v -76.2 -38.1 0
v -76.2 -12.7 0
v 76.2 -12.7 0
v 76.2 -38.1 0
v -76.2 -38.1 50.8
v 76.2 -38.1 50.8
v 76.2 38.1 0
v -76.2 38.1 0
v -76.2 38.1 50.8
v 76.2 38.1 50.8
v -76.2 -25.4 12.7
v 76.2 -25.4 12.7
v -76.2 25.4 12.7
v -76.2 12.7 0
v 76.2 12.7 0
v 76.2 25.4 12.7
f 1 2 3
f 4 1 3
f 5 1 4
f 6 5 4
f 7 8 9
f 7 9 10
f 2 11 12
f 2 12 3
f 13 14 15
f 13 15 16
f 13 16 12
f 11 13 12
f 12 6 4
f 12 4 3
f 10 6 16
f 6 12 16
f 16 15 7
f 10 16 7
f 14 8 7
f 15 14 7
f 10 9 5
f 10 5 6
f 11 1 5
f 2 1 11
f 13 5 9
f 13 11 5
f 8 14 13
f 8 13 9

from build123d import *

# Parameters (mm, degrees)
F0_W     = 152.4
F0_H     = 76.2
F1_DEPTH = 50.8
F3_DEPTH = 152.401


with BuildPart() as f1:
    # F0 (on Top) → F1 (new body)
    with BuildSketch(Plane.XY):
        Rectangle(F0_W, F0_H)
    extrude(amount=F1_DEPTH)

    # F2 (on face) → F3 (cut, through all)
    with BuildSketch(Plane.YZ.offset(76.2)):
        Polygon((-25.4, 12.7), (-12.7, 0), (12.7, 0), (25.4, 12.7), align=None)
    extrude(amount=-F3_DEPTH, mode=Mode.SUBTRACT)


solid = f1.part
